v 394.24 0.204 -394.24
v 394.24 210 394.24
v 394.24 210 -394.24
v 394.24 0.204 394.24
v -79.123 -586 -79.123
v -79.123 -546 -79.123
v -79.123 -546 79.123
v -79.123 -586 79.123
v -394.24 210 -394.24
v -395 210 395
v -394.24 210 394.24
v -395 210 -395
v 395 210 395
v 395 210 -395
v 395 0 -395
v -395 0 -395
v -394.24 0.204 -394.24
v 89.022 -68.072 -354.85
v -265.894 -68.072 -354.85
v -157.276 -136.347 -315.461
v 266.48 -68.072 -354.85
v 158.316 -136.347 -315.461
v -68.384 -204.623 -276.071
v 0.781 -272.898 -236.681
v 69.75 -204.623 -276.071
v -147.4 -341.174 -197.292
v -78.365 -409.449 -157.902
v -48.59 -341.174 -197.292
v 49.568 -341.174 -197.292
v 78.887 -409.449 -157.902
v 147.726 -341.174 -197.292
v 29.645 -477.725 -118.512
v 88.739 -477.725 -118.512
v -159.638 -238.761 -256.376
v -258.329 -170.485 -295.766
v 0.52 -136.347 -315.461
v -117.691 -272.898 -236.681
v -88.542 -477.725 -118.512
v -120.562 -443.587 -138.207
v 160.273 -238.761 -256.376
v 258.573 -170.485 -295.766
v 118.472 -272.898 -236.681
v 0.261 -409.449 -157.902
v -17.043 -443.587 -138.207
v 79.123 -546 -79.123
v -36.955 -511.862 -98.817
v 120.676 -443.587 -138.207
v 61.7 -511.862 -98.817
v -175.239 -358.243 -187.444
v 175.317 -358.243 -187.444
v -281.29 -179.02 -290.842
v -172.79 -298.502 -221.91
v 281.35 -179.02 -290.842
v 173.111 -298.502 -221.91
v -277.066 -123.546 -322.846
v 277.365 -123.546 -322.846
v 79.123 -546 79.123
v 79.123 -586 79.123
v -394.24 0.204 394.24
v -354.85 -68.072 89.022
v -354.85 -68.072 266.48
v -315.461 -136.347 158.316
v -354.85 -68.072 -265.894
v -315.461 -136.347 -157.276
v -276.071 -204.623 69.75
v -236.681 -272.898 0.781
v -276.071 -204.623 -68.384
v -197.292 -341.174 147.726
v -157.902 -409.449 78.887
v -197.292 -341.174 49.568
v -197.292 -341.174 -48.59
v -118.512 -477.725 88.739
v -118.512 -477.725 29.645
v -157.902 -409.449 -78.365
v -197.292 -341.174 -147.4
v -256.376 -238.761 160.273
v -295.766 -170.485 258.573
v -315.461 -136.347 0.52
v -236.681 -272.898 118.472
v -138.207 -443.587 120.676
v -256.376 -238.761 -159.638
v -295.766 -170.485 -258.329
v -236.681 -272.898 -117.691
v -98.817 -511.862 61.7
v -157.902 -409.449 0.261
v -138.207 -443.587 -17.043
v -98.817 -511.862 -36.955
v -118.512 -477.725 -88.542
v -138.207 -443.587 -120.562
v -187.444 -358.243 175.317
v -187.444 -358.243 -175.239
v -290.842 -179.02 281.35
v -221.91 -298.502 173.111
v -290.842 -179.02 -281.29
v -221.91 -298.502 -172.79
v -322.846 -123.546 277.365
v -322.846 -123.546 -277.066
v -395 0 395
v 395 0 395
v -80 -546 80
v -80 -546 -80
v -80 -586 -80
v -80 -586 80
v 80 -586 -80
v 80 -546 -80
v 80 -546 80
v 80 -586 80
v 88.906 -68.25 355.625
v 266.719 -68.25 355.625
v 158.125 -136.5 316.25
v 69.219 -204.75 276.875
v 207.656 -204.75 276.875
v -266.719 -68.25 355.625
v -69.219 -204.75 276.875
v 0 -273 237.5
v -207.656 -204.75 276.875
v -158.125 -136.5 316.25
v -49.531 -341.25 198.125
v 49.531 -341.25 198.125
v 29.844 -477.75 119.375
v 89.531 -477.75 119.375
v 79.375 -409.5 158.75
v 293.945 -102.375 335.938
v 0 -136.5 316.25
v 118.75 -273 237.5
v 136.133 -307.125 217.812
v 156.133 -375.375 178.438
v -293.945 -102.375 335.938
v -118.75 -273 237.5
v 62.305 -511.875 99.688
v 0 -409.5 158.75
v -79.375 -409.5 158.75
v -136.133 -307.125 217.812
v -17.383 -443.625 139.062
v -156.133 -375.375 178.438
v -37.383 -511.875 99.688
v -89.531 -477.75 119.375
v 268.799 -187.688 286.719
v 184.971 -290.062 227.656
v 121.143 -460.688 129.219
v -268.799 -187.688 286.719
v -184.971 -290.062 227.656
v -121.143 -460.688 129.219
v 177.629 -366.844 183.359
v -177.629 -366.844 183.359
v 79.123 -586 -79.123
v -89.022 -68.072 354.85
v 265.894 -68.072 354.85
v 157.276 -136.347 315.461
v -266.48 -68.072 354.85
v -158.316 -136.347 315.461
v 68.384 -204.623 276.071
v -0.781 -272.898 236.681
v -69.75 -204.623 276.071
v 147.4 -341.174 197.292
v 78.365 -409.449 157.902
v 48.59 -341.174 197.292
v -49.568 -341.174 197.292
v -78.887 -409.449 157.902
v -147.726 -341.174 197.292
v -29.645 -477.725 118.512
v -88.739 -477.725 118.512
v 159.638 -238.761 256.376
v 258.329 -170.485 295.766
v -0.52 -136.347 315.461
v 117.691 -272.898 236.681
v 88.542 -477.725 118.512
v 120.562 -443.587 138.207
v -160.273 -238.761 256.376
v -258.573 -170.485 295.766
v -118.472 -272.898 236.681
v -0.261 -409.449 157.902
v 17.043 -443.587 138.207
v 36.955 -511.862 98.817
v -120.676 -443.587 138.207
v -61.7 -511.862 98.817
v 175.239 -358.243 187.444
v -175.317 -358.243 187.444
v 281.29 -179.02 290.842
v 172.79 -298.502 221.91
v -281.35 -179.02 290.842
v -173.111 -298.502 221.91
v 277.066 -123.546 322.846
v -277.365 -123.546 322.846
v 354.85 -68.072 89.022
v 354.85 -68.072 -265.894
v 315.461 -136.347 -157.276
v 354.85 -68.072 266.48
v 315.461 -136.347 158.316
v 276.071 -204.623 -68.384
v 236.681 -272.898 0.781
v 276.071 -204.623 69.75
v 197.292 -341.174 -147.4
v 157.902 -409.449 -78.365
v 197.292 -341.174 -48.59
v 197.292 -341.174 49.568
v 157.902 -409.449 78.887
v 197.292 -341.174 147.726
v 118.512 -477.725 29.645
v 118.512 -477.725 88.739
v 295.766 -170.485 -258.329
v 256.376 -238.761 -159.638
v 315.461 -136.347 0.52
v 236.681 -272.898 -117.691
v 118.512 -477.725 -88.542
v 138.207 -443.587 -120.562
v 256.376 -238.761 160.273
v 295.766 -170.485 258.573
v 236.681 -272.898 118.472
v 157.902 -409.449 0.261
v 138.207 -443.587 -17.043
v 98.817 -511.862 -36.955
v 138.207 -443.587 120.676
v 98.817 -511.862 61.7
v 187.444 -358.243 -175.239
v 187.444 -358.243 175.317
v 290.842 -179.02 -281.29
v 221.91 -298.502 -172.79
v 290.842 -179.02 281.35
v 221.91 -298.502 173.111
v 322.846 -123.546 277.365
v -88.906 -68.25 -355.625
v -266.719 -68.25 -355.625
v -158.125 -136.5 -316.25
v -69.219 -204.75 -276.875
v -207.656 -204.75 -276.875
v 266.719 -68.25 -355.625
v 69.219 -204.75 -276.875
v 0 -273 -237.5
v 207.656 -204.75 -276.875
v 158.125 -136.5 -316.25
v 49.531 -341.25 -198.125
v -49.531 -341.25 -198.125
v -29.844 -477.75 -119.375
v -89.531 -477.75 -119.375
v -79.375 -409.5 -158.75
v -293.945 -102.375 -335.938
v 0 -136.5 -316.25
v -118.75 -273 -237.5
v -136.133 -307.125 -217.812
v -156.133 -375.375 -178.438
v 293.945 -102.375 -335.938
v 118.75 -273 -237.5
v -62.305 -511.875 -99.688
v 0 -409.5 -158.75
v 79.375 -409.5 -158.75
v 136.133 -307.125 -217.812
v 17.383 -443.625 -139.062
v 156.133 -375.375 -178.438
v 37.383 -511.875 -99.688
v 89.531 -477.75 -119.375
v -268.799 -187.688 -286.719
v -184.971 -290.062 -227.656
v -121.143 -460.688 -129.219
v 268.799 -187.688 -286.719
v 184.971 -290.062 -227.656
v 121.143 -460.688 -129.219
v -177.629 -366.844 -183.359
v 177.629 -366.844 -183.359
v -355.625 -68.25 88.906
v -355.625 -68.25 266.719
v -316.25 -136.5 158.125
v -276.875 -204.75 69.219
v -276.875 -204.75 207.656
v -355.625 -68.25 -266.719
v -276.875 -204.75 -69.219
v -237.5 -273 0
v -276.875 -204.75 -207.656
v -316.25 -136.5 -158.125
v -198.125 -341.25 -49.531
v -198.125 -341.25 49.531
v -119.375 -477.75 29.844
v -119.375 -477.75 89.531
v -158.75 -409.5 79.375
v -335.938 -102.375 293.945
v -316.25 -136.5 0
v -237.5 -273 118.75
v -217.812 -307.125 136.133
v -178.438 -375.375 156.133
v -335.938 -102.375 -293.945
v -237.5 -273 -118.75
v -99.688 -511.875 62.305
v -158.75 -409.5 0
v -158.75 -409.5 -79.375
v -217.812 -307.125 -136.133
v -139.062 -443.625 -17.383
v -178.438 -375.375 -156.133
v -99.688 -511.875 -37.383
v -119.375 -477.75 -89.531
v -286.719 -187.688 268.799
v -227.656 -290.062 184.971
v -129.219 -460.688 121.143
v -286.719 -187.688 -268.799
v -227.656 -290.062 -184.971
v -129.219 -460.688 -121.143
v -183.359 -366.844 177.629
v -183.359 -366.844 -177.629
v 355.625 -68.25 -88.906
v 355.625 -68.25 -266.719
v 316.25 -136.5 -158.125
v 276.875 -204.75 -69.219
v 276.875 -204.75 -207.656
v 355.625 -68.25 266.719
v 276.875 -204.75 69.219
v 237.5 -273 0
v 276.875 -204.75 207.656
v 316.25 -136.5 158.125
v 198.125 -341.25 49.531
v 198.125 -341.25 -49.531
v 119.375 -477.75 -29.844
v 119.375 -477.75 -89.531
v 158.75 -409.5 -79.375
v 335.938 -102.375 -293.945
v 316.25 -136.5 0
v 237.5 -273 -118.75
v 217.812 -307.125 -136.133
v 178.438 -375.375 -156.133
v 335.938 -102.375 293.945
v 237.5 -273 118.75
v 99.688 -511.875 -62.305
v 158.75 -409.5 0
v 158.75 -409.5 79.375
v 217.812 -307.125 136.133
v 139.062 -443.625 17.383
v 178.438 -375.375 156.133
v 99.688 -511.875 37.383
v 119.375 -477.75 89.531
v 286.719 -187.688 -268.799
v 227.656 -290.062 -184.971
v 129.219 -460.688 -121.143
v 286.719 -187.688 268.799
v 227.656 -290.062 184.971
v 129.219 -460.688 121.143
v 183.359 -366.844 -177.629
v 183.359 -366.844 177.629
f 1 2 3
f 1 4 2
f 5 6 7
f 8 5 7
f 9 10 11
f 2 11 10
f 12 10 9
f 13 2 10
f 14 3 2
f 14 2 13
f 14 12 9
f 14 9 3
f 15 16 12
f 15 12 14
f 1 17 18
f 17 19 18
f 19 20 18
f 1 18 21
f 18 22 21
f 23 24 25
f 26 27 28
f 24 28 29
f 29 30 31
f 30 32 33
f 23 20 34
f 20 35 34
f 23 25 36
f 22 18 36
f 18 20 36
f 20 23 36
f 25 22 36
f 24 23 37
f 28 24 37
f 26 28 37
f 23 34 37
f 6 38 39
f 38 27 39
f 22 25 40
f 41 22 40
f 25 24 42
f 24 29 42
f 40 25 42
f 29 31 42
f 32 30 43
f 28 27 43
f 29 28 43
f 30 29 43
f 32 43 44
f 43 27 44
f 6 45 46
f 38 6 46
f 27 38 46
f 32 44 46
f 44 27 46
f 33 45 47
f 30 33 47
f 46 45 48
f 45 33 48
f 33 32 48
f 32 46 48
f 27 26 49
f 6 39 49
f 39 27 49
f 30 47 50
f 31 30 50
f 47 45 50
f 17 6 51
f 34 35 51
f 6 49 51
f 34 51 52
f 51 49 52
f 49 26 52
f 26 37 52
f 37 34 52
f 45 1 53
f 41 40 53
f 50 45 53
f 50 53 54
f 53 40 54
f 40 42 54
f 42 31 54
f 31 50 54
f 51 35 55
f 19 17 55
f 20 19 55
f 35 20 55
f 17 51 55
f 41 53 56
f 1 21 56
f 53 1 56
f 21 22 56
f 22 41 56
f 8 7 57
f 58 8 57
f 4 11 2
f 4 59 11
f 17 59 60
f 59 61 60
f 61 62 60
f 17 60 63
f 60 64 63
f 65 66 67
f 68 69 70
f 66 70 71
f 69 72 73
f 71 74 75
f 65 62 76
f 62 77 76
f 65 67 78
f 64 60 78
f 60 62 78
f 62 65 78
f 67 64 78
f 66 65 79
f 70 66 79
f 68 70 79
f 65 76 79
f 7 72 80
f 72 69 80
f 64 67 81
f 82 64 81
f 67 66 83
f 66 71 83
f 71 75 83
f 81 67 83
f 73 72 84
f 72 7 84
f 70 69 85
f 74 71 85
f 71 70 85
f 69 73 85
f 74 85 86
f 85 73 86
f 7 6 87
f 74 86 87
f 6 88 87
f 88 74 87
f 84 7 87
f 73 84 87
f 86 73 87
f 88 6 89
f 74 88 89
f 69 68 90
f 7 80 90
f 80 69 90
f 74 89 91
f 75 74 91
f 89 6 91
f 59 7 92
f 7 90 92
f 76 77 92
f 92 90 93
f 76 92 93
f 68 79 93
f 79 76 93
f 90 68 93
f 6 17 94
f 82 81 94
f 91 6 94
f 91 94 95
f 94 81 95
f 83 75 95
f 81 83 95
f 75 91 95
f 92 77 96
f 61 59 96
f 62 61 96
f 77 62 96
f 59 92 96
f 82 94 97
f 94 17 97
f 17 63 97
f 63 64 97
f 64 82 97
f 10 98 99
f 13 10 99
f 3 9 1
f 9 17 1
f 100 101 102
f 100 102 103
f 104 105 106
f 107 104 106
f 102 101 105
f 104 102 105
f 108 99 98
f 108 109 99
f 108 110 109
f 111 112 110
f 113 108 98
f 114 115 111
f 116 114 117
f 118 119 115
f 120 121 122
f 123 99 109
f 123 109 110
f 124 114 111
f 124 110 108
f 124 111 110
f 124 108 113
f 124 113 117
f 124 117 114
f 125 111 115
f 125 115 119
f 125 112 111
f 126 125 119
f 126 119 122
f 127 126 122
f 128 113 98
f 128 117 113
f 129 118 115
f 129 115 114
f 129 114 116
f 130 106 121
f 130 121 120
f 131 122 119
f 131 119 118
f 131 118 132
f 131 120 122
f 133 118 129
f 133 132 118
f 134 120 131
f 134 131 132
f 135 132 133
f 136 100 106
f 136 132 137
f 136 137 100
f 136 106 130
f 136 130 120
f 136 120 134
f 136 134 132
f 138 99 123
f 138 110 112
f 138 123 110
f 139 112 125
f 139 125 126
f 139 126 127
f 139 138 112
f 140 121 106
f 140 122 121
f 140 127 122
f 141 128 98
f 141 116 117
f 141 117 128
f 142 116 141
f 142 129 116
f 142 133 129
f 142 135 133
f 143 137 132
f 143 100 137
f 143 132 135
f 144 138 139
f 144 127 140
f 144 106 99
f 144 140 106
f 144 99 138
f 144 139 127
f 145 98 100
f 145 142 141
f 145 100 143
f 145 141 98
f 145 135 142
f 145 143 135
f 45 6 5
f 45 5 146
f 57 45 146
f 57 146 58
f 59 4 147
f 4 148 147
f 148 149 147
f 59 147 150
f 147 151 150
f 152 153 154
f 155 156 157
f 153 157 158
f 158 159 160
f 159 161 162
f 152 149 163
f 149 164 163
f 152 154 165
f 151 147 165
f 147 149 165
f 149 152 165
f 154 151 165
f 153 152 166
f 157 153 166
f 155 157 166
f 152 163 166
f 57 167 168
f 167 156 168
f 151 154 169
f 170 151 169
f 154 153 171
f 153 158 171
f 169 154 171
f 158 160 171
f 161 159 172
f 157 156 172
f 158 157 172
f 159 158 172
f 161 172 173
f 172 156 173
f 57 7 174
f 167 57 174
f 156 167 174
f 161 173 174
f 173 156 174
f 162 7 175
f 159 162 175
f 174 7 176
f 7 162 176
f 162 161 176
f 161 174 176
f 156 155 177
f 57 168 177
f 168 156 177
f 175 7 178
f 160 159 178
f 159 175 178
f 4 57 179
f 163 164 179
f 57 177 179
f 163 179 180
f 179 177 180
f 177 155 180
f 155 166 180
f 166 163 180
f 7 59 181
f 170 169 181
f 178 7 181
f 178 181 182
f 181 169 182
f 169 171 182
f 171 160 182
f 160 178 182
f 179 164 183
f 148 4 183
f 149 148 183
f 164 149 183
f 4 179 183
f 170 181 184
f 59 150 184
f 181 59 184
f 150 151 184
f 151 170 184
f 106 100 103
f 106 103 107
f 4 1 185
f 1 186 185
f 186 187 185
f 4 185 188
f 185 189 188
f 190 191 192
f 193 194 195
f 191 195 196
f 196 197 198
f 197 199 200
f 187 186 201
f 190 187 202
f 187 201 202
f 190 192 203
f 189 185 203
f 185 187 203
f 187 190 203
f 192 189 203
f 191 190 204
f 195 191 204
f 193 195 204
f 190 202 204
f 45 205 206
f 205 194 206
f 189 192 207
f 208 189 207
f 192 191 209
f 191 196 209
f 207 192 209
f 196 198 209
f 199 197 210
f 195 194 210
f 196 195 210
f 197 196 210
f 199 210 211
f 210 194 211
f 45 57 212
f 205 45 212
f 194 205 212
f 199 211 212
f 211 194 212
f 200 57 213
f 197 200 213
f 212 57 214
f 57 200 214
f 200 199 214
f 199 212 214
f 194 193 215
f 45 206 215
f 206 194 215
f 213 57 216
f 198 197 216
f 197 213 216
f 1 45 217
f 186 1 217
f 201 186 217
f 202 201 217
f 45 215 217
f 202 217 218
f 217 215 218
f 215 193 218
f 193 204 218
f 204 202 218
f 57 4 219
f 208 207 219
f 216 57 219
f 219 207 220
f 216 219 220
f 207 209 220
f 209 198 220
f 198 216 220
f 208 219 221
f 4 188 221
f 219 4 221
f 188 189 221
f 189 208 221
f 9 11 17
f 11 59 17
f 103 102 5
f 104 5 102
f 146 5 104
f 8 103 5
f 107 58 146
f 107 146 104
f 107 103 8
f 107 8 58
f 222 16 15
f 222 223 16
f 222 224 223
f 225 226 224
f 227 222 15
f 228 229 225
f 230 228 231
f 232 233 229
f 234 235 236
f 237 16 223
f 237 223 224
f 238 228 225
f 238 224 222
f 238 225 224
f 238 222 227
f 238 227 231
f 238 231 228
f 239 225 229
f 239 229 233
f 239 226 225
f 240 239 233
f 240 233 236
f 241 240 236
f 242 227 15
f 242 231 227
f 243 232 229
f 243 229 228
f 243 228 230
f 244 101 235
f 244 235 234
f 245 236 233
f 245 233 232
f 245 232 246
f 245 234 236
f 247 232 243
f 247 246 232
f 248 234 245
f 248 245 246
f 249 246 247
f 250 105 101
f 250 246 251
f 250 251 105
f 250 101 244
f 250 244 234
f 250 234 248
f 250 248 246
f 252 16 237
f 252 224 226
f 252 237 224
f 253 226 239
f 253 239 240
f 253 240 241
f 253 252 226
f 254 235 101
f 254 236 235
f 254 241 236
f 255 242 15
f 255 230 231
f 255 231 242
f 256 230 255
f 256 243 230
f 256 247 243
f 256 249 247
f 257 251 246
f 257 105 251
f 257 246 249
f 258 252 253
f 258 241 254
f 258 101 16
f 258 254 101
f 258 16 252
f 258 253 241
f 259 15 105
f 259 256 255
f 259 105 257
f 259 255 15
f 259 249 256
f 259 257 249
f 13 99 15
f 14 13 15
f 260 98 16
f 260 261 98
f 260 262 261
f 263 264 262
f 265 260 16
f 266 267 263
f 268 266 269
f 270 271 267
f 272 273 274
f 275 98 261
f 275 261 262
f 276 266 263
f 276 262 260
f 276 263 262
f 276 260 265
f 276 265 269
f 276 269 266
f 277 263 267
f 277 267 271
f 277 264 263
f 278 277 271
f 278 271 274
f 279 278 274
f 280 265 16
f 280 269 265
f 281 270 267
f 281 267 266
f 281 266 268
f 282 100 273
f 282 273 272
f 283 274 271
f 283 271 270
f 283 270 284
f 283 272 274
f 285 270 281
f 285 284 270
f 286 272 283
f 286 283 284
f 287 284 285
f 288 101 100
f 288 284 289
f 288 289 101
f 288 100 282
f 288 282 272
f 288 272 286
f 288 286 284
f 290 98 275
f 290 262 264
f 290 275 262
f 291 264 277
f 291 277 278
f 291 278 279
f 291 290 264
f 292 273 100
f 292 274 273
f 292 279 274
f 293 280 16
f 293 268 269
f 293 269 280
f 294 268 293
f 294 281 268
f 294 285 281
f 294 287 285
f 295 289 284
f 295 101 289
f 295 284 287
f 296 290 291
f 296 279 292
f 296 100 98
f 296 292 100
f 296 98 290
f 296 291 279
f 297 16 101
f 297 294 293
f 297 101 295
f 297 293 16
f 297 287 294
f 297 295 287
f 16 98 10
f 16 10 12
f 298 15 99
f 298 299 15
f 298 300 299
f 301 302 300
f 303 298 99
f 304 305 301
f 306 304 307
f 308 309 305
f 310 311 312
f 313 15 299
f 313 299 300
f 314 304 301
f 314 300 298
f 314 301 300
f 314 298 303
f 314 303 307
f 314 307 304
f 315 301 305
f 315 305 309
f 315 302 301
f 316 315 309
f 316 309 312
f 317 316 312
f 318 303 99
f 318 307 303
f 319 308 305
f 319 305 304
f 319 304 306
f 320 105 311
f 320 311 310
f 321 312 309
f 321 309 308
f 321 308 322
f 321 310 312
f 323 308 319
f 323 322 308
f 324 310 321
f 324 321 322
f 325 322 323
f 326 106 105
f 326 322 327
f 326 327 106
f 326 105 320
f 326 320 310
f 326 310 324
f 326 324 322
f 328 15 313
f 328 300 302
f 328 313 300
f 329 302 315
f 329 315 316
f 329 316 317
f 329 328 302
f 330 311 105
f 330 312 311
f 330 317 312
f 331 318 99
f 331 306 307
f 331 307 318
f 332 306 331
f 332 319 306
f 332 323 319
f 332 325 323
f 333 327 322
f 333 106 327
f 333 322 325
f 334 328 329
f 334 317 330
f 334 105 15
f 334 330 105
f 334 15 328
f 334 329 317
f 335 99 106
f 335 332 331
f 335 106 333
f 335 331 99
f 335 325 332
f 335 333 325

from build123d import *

# Parameters (mm, degrees)
CROQUIS3_W              = 790
CROQUIS3_H              = 790
SALIENTE_EXTRUIR1_DEPTH = 210
VACIADO2_T              = -0.76
CROQUIS5_W              = 160
CROQUIS5_H              = 160
CROQUIS5_W_2            = 158.245179758
CROQUIS5_H_2            = 158.245179758
SALIENTE_EXTRUIR2_DEPTH = 40


with BuildPart() as part:
    # Croquis1 → Recubrir1 section 0
    with BuildSketch(Plane(origin=(0, 0, 0), x_dir=(1, 0, 0), z_dir=(0, 1, 0))):
        with BuildLine():
            Line((-395, 395), (395, 395))
            Line((395, 395), (395, -395))
            Line((395, -395), (-395, -395))
            Line((-395, -395), (-395, 395))
        make_face()
    # Croquis2 → Recubrir1 section 1
    with BuildSketch(Plane(origin=(0, -546, 0), x_dir=(1, 0, 0), z_dir=(0, 1, 0))):
        with BuildLine():
            Line((-80, 80), (80, 80))
            Line((80, 80), (80, -80))
            Line((80, -80), (-80, -80))
            Line((-80, -80), (-80, 80))
        make_face()
    loft()

    # Croquis3 → Saliente-Extruir1 (add)
    with BuildSketch(Plane(origin=(0, 0, 0), x_dir=(1, 0, 0), z_dir=(0, 1, 0))):
        Rectangle(CROQUIS3_W, CROQUIS3_H)
    extrude(amount=SALIENTE_EXTRUIR1_DEPTH)

    # Vaciado2
    vaciado2_openings = [part.faces().sort_by_distance(p)[0] for p in [
        (0, -546, 0),
        (0, 210, 0),
    ]]
    offset(amount=VACIADO2_T, openings=vaciado2_openings)

    # Croquis5 → Saliente-Extruir2 (add)
    with BuildSketch(Plane.XZ.offset(546)):
        Rectangle(CROQUIS5_W, CROQUIS5_H)
        Rectangle(CROQUIS5_W_2, CROQUIS5_H_2, mode=Mode.SUBTRACT)
    extrude(amount=SALIENTE_EXTRUIR2_DEPTH)


solid = part.part
